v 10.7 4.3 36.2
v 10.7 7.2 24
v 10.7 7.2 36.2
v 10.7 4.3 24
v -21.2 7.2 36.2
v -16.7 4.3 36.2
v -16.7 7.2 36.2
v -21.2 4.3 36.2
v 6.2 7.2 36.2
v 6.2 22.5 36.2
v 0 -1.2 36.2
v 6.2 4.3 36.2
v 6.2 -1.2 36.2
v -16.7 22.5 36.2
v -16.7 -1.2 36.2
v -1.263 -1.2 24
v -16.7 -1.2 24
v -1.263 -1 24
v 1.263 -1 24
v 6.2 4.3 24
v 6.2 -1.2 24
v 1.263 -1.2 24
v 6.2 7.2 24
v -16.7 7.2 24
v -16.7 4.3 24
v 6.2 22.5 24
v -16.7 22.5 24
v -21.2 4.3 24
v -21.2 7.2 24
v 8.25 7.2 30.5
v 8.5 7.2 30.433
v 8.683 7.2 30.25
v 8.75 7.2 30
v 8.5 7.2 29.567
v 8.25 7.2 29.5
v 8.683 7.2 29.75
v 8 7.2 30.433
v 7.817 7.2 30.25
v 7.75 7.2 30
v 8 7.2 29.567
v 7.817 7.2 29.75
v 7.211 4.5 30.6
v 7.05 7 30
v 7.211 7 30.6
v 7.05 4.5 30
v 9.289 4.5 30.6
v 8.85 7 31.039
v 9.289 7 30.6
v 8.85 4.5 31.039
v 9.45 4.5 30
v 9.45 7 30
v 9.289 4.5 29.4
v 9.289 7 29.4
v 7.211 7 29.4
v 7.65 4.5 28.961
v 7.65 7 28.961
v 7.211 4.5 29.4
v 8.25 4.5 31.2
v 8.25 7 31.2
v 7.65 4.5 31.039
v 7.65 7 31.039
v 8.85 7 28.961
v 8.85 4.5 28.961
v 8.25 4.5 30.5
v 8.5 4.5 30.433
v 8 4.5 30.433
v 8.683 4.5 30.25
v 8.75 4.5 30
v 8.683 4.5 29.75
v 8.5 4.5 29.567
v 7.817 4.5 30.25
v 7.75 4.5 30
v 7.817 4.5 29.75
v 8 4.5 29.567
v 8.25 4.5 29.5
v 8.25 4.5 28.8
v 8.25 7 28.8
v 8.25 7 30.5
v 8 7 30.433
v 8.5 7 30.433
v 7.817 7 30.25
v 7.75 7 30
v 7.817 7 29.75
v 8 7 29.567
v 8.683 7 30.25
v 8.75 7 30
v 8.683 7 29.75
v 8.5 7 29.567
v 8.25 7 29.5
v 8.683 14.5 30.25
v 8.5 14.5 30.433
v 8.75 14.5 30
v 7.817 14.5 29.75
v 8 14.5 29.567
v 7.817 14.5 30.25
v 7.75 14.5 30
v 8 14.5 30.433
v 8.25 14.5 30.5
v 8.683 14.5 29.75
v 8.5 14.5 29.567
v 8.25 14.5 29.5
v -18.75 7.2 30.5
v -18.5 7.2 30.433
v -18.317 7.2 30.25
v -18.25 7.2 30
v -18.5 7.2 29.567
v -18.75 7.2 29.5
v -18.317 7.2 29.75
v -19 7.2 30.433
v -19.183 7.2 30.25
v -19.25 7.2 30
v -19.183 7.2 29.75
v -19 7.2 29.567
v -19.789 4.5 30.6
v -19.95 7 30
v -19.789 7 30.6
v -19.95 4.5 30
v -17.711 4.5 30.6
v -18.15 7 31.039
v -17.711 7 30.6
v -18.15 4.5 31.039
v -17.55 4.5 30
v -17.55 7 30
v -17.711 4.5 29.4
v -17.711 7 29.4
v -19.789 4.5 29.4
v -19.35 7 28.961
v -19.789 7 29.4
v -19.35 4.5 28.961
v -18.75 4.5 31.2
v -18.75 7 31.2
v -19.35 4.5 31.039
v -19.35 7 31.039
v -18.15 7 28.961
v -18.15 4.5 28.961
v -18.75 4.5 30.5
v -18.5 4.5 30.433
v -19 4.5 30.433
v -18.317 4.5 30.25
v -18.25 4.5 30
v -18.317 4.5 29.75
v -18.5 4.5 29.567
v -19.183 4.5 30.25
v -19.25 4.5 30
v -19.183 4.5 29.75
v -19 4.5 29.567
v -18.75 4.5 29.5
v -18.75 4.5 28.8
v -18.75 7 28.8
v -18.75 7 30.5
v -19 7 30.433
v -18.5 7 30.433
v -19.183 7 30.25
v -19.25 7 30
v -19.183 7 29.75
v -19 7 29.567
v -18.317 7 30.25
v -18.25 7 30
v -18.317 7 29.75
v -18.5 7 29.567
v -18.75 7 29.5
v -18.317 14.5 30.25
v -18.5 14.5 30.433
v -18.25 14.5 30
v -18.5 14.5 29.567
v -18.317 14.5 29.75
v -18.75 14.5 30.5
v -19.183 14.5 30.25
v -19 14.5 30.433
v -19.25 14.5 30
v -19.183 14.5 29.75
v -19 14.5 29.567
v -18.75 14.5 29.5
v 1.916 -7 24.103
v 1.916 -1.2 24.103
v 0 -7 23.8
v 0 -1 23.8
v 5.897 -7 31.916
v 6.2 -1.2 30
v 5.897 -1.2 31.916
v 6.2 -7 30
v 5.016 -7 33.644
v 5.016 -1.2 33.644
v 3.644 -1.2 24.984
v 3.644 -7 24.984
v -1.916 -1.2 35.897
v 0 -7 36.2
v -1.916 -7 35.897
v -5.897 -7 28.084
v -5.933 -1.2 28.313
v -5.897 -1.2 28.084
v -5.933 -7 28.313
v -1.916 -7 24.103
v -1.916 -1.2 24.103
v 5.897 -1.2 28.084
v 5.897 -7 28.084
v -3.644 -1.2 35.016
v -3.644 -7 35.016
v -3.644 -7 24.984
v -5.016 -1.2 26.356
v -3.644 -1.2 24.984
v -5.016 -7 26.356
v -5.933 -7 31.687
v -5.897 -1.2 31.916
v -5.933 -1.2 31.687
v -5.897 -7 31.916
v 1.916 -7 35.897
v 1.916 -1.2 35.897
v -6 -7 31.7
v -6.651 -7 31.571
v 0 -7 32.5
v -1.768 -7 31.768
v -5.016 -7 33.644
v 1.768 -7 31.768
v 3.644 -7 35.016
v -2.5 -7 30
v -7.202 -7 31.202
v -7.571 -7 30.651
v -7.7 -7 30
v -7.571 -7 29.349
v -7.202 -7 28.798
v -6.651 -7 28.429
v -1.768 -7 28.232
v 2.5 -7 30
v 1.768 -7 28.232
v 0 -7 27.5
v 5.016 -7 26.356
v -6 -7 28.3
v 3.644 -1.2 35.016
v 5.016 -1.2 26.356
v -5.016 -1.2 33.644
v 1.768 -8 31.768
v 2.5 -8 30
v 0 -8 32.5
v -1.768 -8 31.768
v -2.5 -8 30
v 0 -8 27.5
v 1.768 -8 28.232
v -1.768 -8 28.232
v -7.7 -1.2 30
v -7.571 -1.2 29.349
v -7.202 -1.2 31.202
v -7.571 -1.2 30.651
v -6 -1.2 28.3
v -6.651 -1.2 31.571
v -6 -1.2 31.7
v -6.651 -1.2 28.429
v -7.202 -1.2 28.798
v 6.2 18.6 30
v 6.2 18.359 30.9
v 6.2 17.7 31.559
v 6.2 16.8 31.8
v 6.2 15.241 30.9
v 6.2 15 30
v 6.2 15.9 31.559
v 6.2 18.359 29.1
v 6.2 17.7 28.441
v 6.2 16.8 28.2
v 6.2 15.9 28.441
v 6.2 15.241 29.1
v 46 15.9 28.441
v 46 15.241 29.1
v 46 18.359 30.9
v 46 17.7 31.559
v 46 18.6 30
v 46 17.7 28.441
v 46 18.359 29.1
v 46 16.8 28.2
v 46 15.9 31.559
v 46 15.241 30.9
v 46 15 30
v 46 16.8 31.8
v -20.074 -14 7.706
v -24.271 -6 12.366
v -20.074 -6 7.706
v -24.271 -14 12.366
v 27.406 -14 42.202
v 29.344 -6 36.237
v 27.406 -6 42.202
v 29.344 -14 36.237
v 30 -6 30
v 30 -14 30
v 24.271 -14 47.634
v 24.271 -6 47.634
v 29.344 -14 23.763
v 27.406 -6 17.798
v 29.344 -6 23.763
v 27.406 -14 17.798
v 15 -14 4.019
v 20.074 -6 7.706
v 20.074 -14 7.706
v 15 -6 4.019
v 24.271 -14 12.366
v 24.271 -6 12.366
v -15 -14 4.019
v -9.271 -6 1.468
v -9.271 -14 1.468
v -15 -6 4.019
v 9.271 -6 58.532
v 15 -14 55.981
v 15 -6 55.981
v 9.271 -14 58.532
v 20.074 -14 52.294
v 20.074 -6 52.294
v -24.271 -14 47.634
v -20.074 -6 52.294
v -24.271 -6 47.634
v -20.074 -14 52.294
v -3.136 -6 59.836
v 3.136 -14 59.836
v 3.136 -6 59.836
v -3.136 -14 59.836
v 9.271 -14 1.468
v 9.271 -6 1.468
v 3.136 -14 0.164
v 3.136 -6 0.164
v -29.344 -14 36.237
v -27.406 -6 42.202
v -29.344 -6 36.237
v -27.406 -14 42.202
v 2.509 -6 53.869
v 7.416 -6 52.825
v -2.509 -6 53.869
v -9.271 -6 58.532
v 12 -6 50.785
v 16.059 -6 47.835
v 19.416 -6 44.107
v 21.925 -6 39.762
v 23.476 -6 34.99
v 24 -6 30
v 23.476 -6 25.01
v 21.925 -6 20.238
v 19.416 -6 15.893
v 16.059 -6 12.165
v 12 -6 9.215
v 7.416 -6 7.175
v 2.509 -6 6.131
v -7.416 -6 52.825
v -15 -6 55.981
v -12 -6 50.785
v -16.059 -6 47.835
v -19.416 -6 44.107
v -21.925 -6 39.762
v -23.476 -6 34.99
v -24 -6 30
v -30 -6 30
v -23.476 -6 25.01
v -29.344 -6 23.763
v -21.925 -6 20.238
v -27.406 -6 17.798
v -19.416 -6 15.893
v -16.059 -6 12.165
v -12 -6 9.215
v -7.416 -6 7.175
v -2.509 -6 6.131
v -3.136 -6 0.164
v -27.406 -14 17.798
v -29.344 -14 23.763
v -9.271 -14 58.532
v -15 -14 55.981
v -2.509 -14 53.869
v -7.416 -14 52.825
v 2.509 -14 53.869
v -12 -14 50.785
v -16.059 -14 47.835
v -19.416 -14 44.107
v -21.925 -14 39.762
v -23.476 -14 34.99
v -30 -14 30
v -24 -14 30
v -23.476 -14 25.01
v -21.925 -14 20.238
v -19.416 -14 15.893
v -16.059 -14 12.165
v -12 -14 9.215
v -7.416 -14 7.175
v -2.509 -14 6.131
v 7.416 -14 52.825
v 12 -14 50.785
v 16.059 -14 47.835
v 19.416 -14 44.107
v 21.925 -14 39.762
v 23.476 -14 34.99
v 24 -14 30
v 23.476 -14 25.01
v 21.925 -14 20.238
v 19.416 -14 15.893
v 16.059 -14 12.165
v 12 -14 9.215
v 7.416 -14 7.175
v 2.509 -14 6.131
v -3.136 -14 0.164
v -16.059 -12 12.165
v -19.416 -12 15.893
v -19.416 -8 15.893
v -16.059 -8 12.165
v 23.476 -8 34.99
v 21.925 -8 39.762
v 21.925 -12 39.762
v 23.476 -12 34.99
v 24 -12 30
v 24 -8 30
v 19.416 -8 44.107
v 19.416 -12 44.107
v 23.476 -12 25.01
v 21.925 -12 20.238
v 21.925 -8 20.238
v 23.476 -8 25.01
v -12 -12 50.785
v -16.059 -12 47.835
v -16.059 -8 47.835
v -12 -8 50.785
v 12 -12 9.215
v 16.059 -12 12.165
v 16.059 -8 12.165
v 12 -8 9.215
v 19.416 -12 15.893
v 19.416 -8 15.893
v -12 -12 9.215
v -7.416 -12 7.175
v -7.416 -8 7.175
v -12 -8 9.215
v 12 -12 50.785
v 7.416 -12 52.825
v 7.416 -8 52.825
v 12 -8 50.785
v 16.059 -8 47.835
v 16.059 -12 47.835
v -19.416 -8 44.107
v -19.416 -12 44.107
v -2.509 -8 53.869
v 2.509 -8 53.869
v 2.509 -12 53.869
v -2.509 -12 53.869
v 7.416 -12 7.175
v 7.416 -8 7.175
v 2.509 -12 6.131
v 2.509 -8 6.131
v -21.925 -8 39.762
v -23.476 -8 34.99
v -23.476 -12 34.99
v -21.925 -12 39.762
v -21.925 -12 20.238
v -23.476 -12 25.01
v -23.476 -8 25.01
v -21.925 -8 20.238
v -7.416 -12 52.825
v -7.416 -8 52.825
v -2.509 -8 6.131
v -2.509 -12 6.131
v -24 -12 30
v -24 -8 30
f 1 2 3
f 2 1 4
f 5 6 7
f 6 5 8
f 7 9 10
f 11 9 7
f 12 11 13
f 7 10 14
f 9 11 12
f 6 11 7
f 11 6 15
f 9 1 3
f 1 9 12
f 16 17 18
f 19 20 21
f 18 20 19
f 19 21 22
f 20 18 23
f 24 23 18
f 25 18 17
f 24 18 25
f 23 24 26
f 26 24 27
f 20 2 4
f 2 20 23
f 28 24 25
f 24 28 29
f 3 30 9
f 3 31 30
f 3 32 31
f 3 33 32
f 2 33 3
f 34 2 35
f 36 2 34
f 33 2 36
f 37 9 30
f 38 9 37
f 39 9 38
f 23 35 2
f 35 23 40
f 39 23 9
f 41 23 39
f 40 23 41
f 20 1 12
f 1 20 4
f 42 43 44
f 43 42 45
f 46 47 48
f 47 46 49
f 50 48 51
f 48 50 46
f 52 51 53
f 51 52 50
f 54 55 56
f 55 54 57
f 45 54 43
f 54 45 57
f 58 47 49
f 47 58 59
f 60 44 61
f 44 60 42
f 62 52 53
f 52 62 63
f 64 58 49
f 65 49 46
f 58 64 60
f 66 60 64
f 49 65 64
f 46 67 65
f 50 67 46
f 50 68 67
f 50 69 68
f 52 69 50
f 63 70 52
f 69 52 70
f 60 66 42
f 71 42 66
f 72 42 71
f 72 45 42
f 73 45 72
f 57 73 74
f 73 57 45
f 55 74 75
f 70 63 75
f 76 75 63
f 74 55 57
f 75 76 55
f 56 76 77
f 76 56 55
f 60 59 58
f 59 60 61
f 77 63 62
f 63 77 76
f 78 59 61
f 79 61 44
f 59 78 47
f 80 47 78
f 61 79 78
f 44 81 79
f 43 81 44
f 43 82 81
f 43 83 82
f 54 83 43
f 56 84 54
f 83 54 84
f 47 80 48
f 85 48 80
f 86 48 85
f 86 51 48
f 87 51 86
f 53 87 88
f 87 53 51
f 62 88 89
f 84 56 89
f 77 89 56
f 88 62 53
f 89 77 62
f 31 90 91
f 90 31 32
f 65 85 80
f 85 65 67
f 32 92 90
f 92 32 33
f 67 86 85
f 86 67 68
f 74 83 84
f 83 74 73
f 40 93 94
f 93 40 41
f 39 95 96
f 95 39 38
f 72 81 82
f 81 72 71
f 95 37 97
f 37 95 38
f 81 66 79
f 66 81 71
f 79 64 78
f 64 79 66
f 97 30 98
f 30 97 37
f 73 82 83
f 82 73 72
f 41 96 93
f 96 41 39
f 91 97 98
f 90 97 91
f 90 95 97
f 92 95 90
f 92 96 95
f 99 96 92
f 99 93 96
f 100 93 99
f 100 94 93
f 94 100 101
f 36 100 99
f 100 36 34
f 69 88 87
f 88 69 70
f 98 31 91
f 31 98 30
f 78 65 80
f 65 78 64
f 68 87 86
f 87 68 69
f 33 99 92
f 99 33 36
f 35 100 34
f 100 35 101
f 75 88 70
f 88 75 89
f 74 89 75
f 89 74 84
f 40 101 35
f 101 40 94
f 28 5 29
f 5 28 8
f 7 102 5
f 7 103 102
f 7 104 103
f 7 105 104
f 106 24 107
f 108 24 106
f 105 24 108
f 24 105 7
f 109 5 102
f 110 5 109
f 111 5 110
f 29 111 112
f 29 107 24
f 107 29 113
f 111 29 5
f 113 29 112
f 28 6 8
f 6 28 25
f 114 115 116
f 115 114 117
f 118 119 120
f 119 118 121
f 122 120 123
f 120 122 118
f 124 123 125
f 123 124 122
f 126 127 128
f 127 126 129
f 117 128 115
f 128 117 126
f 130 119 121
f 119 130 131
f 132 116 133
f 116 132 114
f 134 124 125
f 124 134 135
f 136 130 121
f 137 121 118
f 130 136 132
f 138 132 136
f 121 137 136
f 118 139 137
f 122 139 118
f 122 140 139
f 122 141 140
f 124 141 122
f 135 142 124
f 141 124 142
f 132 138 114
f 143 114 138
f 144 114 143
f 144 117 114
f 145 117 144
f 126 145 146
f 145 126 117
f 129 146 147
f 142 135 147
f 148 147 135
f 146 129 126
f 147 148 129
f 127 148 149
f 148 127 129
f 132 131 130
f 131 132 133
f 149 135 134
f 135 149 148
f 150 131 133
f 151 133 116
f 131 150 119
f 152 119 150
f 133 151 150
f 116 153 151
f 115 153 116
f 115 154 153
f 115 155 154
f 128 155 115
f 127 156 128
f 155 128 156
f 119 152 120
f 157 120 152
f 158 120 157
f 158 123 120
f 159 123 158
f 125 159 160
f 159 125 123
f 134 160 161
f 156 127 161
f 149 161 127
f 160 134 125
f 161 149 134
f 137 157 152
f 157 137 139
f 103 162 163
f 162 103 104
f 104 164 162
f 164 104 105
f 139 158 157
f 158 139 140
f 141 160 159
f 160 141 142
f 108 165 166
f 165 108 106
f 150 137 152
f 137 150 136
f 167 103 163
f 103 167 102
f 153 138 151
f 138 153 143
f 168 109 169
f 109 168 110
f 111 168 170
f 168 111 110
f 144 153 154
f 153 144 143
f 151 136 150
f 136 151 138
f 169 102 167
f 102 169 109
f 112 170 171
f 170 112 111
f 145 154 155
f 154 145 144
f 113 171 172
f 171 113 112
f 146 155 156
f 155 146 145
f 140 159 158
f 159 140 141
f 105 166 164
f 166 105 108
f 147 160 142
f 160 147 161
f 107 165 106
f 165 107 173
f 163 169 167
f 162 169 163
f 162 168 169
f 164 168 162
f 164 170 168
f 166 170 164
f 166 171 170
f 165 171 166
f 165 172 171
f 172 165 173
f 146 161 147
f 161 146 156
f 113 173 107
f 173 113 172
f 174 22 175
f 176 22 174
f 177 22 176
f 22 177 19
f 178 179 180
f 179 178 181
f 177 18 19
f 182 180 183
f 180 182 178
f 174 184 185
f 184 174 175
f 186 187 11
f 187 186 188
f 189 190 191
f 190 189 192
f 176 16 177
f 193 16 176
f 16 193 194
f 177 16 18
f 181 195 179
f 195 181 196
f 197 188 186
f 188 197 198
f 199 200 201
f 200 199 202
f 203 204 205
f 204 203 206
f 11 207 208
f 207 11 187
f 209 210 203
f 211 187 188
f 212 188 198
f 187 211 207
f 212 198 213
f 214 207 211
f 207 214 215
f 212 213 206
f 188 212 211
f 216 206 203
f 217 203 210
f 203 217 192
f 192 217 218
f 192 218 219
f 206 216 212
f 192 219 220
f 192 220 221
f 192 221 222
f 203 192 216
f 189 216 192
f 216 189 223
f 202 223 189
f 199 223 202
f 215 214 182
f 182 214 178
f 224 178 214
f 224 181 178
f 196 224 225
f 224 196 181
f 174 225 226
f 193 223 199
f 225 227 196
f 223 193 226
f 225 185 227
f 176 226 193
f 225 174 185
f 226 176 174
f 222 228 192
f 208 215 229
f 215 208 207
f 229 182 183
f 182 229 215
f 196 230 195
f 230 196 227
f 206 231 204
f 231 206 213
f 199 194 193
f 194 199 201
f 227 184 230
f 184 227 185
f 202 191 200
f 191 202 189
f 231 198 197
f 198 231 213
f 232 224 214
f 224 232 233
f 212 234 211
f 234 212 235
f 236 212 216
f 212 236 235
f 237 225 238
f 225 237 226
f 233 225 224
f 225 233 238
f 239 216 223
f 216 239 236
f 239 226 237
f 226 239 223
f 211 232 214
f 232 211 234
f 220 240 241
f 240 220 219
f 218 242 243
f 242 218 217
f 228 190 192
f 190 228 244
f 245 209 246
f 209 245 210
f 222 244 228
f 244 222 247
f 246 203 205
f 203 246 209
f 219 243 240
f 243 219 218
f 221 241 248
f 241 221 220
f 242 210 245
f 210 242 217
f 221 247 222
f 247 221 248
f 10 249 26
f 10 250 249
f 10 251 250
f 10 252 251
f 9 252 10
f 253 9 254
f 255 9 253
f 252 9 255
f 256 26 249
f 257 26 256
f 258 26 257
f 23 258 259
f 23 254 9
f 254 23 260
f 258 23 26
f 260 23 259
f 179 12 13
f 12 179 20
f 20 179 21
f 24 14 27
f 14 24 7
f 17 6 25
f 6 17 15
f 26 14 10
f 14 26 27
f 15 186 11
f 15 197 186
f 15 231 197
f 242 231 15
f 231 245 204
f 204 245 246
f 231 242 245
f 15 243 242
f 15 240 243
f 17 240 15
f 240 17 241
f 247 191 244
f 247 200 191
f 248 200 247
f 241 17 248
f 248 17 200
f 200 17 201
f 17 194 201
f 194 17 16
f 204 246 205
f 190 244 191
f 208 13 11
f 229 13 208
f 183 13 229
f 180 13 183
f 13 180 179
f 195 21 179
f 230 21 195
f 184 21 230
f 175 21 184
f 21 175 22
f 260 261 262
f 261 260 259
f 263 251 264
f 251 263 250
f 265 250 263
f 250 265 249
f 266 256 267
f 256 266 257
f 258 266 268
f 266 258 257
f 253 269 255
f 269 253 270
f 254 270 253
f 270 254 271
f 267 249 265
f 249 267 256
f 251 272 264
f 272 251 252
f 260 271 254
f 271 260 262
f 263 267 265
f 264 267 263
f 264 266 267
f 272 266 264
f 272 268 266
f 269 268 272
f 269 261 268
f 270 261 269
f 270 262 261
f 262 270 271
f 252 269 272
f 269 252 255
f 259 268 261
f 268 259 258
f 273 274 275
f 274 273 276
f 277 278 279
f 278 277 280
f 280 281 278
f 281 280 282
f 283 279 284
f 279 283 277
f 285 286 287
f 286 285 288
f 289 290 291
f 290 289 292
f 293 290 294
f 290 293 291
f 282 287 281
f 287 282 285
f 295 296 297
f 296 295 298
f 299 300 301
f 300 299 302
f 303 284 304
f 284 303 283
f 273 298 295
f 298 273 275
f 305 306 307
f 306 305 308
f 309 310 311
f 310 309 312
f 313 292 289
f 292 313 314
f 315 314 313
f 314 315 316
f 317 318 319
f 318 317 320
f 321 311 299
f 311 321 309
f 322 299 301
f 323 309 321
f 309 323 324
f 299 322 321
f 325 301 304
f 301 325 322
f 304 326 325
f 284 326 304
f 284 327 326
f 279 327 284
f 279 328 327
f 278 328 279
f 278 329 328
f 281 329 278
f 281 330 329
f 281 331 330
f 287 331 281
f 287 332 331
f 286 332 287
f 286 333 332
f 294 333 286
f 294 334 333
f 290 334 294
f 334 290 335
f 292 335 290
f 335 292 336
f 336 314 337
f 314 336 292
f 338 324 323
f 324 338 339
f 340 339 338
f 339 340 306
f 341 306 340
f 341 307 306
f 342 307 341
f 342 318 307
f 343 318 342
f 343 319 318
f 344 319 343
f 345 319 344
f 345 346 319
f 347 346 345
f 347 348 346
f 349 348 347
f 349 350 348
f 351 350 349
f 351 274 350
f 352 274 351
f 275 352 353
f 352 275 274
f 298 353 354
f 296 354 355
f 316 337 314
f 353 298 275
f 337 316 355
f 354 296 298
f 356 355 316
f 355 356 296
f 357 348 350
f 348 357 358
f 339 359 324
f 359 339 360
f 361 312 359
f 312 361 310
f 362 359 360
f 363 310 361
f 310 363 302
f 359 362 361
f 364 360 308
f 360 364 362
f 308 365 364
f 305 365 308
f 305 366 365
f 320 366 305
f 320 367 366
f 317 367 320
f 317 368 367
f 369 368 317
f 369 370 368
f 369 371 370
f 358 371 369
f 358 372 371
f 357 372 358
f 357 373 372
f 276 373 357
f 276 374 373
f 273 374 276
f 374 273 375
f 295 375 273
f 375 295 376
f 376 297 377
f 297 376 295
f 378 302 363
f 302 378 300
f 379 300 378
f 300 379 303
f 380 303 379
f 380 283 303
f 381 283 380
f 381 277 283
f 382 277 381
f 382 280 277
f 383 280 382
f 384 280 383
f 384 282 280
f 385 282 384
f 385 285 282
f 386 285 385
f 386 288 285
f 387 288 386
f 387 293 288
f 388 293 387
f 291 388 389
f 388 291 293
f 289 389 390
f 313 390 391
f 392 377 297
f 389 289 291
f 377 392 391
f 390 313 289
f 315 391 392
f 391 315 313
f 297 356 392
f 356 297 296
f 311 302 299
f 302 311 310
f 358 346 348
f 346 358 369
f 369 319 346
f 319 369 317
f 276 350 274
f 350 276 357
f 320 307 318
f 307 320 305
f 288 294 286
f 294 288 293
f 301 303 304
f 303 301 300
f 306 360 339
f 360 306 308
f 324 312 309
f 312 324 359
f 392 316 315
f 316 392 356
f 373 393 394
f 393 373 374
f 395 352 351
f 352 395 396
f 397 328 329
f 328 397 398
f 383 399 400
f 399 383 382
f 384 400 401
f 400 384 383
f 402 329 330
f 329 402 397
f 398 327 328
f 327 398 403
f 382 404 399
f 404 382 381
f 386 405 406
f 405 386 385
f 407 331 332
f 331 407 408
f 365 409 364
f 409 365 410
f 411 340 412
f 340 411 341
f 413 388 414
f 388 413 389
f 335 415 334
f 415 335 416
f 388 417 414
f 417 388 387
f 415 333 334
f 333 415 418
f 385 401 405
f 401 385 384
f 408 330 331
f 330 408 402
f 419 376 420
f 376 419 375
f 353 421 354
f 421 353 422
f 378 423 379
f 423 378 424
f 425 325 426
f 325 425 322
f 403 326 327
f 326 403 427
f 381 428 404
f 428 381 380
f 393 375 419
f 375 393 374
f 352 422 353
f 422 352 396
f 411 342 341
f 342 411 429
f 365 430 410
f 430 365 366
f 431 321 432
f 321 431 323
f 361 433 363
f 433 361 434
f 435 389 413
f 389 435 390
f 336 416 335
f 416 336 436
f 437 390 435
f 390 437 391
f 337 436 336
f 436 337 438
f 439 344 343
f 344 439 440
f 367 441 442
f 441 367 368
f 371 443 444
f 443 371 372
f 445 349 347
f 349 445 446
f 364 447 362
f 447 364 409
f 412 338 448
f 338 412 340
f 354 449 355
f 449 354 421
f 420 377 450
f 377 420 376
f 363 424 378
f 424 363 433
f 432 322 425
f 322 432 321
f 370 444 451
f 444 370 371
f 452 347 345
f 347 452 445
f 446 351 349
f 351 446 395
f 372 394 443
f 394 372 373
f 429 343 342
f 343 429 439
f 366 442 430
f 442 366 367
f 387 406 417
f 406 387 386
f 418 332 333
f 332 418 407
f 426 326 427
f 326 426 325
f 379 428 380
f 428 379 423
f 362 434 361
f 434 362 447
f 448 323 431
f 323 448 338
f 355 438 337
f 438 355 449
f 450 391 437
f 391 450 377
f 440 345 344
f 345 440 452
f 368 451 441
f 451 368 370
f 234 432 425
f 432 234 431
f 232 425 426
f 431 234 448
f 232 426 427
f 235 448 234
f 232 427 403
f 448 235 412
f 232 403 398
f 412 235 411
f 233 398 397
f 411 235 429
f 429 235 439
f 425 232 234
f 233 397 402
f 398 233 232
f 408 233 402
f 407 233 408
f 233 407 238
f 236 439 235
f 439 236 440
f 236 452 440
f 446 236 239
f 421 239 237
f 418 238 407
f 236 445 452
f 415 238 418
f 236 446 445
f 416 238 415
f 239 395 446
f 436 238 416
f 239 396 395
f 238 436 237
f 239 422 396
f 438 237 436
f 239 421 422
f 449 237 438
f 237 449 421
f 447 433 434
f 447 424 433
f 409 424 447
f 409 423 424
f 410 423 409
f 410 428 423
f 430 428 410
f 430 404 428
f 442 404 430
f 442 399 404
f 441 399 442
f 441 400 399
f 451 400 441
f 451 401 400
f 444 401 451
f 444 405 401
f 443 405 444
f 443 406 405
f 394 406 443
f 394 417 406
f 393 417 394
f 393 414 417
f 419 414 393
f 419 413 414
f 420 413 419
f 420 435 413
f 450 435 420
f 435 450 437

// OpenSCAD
    box_width=22.5;
    box_depth=23.3;
    box_height=12;
    cylinder_depth=6;
    small_cylinder=3;
    cylinders_width=15;
    gear_radius=2.5;
    gear_height=3;
    fixation_depth=2.5;
    fixation_width=4.5;
    fixation_depth_position=5.5;
    vis_hole=1;
    screw_radius=0.5;
    screw_long=10;
    cable_radius=1.6;
    cable_depth=5.5;


    wheel_depth=8;
    wheel_height=6;
    wheel_radius=30;
    wheel_depth_int=4;
    wheel_gear=2;


function wheelRadius() = wheel_radius;


module servo(with_screw=false,with_cable=false,with_screw_hole=true,security=0) {        
    //big cylinder
    translate([box_width-box_height/2,0,box_height/2]){
        rotate([90,0,0]){
            #cylinder(cylinder_depth,d=box_height+2*security);
        }
    }
    //gear
    translate([box_width-box_height/2,-cylinder_depth,box_height/2]){
        rotate([90,0,0]){
            cylinder(gear_height,gear_radius,gear_radius);
        }
    }
    //small cylinder
    translate([box_width-(cylinders_width-small_cylinder),0,box_height/2]){
        rotate([90,0,0]){
            cylinder(cylinder_depth,d=small_cylinder+2*security,$fn=16);
        }
    }
    //box
    translate([-security,-security,0]) cube([box_width+2*security,box_depth+2*security,box_height+security]);
    
    //fixation droite
    translate([box_width,fixation_depth_position,0]){
        difference() {
            translate([-security,-security,0]) cube([fixation_width+2*security,fixation_depth+2*security,box_height+security]);
            if (with_screw_hole) {
                translate([fixation_width/2,fixation_depth,box_height/2]){
                    rotate([90,0,0]){
                        cylinder(fixation_depth,d=2*(vis_hole+security),$fn=12);
                    }
                }
            }
        }
        if (with_screw) {
            translate([fixation_width/2,screw_long,box_height/2]){
                rotate([90,0,0]){
                    #cylinder(screw_long,screw_radius,screw_radius,$fn=12);
                }
            }
        }
    }
    //fixation gauche
    translate([-fixation_width,fixation_depth_position,0]){
        difference() {
            translate([-security,-security,0]) cube([fixation_width+2*security,fixation_depth+2*security,box_height+security]);
            if (with_screw_hole) {
                translate([fixation_width/2,fixation_depth,box_height/2]){
                    rotate([90,0,0]){
                        cylinder(fixation_depth,d=2*(vis_hole+security),$fn=12);
                    }
                }
            }
        }
        if (with_screw) {
            translate([fixation_width/2,screw_long,box_height/2]){
                rotate([90,0,0]){
                    #cylinder(screw_long,screw_radius,screw_radius,$fn=12);
                }
            }
        }
    }
    if (with_cable) {
        translate([box_width,box_depth-cable_depth,box_height/2]){
            rotate([90,0,90]){
                cylinder(40,d=2*(cable_radius+security),$fn=12);
            }
        }
    }
}

module wheel() {    
    translate([0,0,wheel_radius]){
        rotate([90,0,0]){
            difference() {
                cylinder(wheel_depth,wheel_radius,wheel_radius);
                cylinder(wheel_depth,wheel_radius-wheel_height,wheel_radius-wheel_height);
            }
            translate([0,0,(wheel_depth-wheel_depth_int)/2]){
                cylinder(wheel_depth_int,wheel_radius-wheel_height,wheel_radius-wheel_height);
            }
        }
    }
}


module servo_wheel(with_screw=false,with_cable=false,with_screw_hole=true,security=0) {
    translate([0,-cylinder_depth,]){
        translate([-(box_width-box_height/2), (cylinder_depth+gear_height)-(wheel_depth-wheel_depth_int)/2-wheel_gear,wheel_radius-box_height/2]){
            servo(with_screw,with_cable,with_screw_hole,security=security);
        }

        wheel();
    }
}

servo_wheel(true,true,security=0.2);
